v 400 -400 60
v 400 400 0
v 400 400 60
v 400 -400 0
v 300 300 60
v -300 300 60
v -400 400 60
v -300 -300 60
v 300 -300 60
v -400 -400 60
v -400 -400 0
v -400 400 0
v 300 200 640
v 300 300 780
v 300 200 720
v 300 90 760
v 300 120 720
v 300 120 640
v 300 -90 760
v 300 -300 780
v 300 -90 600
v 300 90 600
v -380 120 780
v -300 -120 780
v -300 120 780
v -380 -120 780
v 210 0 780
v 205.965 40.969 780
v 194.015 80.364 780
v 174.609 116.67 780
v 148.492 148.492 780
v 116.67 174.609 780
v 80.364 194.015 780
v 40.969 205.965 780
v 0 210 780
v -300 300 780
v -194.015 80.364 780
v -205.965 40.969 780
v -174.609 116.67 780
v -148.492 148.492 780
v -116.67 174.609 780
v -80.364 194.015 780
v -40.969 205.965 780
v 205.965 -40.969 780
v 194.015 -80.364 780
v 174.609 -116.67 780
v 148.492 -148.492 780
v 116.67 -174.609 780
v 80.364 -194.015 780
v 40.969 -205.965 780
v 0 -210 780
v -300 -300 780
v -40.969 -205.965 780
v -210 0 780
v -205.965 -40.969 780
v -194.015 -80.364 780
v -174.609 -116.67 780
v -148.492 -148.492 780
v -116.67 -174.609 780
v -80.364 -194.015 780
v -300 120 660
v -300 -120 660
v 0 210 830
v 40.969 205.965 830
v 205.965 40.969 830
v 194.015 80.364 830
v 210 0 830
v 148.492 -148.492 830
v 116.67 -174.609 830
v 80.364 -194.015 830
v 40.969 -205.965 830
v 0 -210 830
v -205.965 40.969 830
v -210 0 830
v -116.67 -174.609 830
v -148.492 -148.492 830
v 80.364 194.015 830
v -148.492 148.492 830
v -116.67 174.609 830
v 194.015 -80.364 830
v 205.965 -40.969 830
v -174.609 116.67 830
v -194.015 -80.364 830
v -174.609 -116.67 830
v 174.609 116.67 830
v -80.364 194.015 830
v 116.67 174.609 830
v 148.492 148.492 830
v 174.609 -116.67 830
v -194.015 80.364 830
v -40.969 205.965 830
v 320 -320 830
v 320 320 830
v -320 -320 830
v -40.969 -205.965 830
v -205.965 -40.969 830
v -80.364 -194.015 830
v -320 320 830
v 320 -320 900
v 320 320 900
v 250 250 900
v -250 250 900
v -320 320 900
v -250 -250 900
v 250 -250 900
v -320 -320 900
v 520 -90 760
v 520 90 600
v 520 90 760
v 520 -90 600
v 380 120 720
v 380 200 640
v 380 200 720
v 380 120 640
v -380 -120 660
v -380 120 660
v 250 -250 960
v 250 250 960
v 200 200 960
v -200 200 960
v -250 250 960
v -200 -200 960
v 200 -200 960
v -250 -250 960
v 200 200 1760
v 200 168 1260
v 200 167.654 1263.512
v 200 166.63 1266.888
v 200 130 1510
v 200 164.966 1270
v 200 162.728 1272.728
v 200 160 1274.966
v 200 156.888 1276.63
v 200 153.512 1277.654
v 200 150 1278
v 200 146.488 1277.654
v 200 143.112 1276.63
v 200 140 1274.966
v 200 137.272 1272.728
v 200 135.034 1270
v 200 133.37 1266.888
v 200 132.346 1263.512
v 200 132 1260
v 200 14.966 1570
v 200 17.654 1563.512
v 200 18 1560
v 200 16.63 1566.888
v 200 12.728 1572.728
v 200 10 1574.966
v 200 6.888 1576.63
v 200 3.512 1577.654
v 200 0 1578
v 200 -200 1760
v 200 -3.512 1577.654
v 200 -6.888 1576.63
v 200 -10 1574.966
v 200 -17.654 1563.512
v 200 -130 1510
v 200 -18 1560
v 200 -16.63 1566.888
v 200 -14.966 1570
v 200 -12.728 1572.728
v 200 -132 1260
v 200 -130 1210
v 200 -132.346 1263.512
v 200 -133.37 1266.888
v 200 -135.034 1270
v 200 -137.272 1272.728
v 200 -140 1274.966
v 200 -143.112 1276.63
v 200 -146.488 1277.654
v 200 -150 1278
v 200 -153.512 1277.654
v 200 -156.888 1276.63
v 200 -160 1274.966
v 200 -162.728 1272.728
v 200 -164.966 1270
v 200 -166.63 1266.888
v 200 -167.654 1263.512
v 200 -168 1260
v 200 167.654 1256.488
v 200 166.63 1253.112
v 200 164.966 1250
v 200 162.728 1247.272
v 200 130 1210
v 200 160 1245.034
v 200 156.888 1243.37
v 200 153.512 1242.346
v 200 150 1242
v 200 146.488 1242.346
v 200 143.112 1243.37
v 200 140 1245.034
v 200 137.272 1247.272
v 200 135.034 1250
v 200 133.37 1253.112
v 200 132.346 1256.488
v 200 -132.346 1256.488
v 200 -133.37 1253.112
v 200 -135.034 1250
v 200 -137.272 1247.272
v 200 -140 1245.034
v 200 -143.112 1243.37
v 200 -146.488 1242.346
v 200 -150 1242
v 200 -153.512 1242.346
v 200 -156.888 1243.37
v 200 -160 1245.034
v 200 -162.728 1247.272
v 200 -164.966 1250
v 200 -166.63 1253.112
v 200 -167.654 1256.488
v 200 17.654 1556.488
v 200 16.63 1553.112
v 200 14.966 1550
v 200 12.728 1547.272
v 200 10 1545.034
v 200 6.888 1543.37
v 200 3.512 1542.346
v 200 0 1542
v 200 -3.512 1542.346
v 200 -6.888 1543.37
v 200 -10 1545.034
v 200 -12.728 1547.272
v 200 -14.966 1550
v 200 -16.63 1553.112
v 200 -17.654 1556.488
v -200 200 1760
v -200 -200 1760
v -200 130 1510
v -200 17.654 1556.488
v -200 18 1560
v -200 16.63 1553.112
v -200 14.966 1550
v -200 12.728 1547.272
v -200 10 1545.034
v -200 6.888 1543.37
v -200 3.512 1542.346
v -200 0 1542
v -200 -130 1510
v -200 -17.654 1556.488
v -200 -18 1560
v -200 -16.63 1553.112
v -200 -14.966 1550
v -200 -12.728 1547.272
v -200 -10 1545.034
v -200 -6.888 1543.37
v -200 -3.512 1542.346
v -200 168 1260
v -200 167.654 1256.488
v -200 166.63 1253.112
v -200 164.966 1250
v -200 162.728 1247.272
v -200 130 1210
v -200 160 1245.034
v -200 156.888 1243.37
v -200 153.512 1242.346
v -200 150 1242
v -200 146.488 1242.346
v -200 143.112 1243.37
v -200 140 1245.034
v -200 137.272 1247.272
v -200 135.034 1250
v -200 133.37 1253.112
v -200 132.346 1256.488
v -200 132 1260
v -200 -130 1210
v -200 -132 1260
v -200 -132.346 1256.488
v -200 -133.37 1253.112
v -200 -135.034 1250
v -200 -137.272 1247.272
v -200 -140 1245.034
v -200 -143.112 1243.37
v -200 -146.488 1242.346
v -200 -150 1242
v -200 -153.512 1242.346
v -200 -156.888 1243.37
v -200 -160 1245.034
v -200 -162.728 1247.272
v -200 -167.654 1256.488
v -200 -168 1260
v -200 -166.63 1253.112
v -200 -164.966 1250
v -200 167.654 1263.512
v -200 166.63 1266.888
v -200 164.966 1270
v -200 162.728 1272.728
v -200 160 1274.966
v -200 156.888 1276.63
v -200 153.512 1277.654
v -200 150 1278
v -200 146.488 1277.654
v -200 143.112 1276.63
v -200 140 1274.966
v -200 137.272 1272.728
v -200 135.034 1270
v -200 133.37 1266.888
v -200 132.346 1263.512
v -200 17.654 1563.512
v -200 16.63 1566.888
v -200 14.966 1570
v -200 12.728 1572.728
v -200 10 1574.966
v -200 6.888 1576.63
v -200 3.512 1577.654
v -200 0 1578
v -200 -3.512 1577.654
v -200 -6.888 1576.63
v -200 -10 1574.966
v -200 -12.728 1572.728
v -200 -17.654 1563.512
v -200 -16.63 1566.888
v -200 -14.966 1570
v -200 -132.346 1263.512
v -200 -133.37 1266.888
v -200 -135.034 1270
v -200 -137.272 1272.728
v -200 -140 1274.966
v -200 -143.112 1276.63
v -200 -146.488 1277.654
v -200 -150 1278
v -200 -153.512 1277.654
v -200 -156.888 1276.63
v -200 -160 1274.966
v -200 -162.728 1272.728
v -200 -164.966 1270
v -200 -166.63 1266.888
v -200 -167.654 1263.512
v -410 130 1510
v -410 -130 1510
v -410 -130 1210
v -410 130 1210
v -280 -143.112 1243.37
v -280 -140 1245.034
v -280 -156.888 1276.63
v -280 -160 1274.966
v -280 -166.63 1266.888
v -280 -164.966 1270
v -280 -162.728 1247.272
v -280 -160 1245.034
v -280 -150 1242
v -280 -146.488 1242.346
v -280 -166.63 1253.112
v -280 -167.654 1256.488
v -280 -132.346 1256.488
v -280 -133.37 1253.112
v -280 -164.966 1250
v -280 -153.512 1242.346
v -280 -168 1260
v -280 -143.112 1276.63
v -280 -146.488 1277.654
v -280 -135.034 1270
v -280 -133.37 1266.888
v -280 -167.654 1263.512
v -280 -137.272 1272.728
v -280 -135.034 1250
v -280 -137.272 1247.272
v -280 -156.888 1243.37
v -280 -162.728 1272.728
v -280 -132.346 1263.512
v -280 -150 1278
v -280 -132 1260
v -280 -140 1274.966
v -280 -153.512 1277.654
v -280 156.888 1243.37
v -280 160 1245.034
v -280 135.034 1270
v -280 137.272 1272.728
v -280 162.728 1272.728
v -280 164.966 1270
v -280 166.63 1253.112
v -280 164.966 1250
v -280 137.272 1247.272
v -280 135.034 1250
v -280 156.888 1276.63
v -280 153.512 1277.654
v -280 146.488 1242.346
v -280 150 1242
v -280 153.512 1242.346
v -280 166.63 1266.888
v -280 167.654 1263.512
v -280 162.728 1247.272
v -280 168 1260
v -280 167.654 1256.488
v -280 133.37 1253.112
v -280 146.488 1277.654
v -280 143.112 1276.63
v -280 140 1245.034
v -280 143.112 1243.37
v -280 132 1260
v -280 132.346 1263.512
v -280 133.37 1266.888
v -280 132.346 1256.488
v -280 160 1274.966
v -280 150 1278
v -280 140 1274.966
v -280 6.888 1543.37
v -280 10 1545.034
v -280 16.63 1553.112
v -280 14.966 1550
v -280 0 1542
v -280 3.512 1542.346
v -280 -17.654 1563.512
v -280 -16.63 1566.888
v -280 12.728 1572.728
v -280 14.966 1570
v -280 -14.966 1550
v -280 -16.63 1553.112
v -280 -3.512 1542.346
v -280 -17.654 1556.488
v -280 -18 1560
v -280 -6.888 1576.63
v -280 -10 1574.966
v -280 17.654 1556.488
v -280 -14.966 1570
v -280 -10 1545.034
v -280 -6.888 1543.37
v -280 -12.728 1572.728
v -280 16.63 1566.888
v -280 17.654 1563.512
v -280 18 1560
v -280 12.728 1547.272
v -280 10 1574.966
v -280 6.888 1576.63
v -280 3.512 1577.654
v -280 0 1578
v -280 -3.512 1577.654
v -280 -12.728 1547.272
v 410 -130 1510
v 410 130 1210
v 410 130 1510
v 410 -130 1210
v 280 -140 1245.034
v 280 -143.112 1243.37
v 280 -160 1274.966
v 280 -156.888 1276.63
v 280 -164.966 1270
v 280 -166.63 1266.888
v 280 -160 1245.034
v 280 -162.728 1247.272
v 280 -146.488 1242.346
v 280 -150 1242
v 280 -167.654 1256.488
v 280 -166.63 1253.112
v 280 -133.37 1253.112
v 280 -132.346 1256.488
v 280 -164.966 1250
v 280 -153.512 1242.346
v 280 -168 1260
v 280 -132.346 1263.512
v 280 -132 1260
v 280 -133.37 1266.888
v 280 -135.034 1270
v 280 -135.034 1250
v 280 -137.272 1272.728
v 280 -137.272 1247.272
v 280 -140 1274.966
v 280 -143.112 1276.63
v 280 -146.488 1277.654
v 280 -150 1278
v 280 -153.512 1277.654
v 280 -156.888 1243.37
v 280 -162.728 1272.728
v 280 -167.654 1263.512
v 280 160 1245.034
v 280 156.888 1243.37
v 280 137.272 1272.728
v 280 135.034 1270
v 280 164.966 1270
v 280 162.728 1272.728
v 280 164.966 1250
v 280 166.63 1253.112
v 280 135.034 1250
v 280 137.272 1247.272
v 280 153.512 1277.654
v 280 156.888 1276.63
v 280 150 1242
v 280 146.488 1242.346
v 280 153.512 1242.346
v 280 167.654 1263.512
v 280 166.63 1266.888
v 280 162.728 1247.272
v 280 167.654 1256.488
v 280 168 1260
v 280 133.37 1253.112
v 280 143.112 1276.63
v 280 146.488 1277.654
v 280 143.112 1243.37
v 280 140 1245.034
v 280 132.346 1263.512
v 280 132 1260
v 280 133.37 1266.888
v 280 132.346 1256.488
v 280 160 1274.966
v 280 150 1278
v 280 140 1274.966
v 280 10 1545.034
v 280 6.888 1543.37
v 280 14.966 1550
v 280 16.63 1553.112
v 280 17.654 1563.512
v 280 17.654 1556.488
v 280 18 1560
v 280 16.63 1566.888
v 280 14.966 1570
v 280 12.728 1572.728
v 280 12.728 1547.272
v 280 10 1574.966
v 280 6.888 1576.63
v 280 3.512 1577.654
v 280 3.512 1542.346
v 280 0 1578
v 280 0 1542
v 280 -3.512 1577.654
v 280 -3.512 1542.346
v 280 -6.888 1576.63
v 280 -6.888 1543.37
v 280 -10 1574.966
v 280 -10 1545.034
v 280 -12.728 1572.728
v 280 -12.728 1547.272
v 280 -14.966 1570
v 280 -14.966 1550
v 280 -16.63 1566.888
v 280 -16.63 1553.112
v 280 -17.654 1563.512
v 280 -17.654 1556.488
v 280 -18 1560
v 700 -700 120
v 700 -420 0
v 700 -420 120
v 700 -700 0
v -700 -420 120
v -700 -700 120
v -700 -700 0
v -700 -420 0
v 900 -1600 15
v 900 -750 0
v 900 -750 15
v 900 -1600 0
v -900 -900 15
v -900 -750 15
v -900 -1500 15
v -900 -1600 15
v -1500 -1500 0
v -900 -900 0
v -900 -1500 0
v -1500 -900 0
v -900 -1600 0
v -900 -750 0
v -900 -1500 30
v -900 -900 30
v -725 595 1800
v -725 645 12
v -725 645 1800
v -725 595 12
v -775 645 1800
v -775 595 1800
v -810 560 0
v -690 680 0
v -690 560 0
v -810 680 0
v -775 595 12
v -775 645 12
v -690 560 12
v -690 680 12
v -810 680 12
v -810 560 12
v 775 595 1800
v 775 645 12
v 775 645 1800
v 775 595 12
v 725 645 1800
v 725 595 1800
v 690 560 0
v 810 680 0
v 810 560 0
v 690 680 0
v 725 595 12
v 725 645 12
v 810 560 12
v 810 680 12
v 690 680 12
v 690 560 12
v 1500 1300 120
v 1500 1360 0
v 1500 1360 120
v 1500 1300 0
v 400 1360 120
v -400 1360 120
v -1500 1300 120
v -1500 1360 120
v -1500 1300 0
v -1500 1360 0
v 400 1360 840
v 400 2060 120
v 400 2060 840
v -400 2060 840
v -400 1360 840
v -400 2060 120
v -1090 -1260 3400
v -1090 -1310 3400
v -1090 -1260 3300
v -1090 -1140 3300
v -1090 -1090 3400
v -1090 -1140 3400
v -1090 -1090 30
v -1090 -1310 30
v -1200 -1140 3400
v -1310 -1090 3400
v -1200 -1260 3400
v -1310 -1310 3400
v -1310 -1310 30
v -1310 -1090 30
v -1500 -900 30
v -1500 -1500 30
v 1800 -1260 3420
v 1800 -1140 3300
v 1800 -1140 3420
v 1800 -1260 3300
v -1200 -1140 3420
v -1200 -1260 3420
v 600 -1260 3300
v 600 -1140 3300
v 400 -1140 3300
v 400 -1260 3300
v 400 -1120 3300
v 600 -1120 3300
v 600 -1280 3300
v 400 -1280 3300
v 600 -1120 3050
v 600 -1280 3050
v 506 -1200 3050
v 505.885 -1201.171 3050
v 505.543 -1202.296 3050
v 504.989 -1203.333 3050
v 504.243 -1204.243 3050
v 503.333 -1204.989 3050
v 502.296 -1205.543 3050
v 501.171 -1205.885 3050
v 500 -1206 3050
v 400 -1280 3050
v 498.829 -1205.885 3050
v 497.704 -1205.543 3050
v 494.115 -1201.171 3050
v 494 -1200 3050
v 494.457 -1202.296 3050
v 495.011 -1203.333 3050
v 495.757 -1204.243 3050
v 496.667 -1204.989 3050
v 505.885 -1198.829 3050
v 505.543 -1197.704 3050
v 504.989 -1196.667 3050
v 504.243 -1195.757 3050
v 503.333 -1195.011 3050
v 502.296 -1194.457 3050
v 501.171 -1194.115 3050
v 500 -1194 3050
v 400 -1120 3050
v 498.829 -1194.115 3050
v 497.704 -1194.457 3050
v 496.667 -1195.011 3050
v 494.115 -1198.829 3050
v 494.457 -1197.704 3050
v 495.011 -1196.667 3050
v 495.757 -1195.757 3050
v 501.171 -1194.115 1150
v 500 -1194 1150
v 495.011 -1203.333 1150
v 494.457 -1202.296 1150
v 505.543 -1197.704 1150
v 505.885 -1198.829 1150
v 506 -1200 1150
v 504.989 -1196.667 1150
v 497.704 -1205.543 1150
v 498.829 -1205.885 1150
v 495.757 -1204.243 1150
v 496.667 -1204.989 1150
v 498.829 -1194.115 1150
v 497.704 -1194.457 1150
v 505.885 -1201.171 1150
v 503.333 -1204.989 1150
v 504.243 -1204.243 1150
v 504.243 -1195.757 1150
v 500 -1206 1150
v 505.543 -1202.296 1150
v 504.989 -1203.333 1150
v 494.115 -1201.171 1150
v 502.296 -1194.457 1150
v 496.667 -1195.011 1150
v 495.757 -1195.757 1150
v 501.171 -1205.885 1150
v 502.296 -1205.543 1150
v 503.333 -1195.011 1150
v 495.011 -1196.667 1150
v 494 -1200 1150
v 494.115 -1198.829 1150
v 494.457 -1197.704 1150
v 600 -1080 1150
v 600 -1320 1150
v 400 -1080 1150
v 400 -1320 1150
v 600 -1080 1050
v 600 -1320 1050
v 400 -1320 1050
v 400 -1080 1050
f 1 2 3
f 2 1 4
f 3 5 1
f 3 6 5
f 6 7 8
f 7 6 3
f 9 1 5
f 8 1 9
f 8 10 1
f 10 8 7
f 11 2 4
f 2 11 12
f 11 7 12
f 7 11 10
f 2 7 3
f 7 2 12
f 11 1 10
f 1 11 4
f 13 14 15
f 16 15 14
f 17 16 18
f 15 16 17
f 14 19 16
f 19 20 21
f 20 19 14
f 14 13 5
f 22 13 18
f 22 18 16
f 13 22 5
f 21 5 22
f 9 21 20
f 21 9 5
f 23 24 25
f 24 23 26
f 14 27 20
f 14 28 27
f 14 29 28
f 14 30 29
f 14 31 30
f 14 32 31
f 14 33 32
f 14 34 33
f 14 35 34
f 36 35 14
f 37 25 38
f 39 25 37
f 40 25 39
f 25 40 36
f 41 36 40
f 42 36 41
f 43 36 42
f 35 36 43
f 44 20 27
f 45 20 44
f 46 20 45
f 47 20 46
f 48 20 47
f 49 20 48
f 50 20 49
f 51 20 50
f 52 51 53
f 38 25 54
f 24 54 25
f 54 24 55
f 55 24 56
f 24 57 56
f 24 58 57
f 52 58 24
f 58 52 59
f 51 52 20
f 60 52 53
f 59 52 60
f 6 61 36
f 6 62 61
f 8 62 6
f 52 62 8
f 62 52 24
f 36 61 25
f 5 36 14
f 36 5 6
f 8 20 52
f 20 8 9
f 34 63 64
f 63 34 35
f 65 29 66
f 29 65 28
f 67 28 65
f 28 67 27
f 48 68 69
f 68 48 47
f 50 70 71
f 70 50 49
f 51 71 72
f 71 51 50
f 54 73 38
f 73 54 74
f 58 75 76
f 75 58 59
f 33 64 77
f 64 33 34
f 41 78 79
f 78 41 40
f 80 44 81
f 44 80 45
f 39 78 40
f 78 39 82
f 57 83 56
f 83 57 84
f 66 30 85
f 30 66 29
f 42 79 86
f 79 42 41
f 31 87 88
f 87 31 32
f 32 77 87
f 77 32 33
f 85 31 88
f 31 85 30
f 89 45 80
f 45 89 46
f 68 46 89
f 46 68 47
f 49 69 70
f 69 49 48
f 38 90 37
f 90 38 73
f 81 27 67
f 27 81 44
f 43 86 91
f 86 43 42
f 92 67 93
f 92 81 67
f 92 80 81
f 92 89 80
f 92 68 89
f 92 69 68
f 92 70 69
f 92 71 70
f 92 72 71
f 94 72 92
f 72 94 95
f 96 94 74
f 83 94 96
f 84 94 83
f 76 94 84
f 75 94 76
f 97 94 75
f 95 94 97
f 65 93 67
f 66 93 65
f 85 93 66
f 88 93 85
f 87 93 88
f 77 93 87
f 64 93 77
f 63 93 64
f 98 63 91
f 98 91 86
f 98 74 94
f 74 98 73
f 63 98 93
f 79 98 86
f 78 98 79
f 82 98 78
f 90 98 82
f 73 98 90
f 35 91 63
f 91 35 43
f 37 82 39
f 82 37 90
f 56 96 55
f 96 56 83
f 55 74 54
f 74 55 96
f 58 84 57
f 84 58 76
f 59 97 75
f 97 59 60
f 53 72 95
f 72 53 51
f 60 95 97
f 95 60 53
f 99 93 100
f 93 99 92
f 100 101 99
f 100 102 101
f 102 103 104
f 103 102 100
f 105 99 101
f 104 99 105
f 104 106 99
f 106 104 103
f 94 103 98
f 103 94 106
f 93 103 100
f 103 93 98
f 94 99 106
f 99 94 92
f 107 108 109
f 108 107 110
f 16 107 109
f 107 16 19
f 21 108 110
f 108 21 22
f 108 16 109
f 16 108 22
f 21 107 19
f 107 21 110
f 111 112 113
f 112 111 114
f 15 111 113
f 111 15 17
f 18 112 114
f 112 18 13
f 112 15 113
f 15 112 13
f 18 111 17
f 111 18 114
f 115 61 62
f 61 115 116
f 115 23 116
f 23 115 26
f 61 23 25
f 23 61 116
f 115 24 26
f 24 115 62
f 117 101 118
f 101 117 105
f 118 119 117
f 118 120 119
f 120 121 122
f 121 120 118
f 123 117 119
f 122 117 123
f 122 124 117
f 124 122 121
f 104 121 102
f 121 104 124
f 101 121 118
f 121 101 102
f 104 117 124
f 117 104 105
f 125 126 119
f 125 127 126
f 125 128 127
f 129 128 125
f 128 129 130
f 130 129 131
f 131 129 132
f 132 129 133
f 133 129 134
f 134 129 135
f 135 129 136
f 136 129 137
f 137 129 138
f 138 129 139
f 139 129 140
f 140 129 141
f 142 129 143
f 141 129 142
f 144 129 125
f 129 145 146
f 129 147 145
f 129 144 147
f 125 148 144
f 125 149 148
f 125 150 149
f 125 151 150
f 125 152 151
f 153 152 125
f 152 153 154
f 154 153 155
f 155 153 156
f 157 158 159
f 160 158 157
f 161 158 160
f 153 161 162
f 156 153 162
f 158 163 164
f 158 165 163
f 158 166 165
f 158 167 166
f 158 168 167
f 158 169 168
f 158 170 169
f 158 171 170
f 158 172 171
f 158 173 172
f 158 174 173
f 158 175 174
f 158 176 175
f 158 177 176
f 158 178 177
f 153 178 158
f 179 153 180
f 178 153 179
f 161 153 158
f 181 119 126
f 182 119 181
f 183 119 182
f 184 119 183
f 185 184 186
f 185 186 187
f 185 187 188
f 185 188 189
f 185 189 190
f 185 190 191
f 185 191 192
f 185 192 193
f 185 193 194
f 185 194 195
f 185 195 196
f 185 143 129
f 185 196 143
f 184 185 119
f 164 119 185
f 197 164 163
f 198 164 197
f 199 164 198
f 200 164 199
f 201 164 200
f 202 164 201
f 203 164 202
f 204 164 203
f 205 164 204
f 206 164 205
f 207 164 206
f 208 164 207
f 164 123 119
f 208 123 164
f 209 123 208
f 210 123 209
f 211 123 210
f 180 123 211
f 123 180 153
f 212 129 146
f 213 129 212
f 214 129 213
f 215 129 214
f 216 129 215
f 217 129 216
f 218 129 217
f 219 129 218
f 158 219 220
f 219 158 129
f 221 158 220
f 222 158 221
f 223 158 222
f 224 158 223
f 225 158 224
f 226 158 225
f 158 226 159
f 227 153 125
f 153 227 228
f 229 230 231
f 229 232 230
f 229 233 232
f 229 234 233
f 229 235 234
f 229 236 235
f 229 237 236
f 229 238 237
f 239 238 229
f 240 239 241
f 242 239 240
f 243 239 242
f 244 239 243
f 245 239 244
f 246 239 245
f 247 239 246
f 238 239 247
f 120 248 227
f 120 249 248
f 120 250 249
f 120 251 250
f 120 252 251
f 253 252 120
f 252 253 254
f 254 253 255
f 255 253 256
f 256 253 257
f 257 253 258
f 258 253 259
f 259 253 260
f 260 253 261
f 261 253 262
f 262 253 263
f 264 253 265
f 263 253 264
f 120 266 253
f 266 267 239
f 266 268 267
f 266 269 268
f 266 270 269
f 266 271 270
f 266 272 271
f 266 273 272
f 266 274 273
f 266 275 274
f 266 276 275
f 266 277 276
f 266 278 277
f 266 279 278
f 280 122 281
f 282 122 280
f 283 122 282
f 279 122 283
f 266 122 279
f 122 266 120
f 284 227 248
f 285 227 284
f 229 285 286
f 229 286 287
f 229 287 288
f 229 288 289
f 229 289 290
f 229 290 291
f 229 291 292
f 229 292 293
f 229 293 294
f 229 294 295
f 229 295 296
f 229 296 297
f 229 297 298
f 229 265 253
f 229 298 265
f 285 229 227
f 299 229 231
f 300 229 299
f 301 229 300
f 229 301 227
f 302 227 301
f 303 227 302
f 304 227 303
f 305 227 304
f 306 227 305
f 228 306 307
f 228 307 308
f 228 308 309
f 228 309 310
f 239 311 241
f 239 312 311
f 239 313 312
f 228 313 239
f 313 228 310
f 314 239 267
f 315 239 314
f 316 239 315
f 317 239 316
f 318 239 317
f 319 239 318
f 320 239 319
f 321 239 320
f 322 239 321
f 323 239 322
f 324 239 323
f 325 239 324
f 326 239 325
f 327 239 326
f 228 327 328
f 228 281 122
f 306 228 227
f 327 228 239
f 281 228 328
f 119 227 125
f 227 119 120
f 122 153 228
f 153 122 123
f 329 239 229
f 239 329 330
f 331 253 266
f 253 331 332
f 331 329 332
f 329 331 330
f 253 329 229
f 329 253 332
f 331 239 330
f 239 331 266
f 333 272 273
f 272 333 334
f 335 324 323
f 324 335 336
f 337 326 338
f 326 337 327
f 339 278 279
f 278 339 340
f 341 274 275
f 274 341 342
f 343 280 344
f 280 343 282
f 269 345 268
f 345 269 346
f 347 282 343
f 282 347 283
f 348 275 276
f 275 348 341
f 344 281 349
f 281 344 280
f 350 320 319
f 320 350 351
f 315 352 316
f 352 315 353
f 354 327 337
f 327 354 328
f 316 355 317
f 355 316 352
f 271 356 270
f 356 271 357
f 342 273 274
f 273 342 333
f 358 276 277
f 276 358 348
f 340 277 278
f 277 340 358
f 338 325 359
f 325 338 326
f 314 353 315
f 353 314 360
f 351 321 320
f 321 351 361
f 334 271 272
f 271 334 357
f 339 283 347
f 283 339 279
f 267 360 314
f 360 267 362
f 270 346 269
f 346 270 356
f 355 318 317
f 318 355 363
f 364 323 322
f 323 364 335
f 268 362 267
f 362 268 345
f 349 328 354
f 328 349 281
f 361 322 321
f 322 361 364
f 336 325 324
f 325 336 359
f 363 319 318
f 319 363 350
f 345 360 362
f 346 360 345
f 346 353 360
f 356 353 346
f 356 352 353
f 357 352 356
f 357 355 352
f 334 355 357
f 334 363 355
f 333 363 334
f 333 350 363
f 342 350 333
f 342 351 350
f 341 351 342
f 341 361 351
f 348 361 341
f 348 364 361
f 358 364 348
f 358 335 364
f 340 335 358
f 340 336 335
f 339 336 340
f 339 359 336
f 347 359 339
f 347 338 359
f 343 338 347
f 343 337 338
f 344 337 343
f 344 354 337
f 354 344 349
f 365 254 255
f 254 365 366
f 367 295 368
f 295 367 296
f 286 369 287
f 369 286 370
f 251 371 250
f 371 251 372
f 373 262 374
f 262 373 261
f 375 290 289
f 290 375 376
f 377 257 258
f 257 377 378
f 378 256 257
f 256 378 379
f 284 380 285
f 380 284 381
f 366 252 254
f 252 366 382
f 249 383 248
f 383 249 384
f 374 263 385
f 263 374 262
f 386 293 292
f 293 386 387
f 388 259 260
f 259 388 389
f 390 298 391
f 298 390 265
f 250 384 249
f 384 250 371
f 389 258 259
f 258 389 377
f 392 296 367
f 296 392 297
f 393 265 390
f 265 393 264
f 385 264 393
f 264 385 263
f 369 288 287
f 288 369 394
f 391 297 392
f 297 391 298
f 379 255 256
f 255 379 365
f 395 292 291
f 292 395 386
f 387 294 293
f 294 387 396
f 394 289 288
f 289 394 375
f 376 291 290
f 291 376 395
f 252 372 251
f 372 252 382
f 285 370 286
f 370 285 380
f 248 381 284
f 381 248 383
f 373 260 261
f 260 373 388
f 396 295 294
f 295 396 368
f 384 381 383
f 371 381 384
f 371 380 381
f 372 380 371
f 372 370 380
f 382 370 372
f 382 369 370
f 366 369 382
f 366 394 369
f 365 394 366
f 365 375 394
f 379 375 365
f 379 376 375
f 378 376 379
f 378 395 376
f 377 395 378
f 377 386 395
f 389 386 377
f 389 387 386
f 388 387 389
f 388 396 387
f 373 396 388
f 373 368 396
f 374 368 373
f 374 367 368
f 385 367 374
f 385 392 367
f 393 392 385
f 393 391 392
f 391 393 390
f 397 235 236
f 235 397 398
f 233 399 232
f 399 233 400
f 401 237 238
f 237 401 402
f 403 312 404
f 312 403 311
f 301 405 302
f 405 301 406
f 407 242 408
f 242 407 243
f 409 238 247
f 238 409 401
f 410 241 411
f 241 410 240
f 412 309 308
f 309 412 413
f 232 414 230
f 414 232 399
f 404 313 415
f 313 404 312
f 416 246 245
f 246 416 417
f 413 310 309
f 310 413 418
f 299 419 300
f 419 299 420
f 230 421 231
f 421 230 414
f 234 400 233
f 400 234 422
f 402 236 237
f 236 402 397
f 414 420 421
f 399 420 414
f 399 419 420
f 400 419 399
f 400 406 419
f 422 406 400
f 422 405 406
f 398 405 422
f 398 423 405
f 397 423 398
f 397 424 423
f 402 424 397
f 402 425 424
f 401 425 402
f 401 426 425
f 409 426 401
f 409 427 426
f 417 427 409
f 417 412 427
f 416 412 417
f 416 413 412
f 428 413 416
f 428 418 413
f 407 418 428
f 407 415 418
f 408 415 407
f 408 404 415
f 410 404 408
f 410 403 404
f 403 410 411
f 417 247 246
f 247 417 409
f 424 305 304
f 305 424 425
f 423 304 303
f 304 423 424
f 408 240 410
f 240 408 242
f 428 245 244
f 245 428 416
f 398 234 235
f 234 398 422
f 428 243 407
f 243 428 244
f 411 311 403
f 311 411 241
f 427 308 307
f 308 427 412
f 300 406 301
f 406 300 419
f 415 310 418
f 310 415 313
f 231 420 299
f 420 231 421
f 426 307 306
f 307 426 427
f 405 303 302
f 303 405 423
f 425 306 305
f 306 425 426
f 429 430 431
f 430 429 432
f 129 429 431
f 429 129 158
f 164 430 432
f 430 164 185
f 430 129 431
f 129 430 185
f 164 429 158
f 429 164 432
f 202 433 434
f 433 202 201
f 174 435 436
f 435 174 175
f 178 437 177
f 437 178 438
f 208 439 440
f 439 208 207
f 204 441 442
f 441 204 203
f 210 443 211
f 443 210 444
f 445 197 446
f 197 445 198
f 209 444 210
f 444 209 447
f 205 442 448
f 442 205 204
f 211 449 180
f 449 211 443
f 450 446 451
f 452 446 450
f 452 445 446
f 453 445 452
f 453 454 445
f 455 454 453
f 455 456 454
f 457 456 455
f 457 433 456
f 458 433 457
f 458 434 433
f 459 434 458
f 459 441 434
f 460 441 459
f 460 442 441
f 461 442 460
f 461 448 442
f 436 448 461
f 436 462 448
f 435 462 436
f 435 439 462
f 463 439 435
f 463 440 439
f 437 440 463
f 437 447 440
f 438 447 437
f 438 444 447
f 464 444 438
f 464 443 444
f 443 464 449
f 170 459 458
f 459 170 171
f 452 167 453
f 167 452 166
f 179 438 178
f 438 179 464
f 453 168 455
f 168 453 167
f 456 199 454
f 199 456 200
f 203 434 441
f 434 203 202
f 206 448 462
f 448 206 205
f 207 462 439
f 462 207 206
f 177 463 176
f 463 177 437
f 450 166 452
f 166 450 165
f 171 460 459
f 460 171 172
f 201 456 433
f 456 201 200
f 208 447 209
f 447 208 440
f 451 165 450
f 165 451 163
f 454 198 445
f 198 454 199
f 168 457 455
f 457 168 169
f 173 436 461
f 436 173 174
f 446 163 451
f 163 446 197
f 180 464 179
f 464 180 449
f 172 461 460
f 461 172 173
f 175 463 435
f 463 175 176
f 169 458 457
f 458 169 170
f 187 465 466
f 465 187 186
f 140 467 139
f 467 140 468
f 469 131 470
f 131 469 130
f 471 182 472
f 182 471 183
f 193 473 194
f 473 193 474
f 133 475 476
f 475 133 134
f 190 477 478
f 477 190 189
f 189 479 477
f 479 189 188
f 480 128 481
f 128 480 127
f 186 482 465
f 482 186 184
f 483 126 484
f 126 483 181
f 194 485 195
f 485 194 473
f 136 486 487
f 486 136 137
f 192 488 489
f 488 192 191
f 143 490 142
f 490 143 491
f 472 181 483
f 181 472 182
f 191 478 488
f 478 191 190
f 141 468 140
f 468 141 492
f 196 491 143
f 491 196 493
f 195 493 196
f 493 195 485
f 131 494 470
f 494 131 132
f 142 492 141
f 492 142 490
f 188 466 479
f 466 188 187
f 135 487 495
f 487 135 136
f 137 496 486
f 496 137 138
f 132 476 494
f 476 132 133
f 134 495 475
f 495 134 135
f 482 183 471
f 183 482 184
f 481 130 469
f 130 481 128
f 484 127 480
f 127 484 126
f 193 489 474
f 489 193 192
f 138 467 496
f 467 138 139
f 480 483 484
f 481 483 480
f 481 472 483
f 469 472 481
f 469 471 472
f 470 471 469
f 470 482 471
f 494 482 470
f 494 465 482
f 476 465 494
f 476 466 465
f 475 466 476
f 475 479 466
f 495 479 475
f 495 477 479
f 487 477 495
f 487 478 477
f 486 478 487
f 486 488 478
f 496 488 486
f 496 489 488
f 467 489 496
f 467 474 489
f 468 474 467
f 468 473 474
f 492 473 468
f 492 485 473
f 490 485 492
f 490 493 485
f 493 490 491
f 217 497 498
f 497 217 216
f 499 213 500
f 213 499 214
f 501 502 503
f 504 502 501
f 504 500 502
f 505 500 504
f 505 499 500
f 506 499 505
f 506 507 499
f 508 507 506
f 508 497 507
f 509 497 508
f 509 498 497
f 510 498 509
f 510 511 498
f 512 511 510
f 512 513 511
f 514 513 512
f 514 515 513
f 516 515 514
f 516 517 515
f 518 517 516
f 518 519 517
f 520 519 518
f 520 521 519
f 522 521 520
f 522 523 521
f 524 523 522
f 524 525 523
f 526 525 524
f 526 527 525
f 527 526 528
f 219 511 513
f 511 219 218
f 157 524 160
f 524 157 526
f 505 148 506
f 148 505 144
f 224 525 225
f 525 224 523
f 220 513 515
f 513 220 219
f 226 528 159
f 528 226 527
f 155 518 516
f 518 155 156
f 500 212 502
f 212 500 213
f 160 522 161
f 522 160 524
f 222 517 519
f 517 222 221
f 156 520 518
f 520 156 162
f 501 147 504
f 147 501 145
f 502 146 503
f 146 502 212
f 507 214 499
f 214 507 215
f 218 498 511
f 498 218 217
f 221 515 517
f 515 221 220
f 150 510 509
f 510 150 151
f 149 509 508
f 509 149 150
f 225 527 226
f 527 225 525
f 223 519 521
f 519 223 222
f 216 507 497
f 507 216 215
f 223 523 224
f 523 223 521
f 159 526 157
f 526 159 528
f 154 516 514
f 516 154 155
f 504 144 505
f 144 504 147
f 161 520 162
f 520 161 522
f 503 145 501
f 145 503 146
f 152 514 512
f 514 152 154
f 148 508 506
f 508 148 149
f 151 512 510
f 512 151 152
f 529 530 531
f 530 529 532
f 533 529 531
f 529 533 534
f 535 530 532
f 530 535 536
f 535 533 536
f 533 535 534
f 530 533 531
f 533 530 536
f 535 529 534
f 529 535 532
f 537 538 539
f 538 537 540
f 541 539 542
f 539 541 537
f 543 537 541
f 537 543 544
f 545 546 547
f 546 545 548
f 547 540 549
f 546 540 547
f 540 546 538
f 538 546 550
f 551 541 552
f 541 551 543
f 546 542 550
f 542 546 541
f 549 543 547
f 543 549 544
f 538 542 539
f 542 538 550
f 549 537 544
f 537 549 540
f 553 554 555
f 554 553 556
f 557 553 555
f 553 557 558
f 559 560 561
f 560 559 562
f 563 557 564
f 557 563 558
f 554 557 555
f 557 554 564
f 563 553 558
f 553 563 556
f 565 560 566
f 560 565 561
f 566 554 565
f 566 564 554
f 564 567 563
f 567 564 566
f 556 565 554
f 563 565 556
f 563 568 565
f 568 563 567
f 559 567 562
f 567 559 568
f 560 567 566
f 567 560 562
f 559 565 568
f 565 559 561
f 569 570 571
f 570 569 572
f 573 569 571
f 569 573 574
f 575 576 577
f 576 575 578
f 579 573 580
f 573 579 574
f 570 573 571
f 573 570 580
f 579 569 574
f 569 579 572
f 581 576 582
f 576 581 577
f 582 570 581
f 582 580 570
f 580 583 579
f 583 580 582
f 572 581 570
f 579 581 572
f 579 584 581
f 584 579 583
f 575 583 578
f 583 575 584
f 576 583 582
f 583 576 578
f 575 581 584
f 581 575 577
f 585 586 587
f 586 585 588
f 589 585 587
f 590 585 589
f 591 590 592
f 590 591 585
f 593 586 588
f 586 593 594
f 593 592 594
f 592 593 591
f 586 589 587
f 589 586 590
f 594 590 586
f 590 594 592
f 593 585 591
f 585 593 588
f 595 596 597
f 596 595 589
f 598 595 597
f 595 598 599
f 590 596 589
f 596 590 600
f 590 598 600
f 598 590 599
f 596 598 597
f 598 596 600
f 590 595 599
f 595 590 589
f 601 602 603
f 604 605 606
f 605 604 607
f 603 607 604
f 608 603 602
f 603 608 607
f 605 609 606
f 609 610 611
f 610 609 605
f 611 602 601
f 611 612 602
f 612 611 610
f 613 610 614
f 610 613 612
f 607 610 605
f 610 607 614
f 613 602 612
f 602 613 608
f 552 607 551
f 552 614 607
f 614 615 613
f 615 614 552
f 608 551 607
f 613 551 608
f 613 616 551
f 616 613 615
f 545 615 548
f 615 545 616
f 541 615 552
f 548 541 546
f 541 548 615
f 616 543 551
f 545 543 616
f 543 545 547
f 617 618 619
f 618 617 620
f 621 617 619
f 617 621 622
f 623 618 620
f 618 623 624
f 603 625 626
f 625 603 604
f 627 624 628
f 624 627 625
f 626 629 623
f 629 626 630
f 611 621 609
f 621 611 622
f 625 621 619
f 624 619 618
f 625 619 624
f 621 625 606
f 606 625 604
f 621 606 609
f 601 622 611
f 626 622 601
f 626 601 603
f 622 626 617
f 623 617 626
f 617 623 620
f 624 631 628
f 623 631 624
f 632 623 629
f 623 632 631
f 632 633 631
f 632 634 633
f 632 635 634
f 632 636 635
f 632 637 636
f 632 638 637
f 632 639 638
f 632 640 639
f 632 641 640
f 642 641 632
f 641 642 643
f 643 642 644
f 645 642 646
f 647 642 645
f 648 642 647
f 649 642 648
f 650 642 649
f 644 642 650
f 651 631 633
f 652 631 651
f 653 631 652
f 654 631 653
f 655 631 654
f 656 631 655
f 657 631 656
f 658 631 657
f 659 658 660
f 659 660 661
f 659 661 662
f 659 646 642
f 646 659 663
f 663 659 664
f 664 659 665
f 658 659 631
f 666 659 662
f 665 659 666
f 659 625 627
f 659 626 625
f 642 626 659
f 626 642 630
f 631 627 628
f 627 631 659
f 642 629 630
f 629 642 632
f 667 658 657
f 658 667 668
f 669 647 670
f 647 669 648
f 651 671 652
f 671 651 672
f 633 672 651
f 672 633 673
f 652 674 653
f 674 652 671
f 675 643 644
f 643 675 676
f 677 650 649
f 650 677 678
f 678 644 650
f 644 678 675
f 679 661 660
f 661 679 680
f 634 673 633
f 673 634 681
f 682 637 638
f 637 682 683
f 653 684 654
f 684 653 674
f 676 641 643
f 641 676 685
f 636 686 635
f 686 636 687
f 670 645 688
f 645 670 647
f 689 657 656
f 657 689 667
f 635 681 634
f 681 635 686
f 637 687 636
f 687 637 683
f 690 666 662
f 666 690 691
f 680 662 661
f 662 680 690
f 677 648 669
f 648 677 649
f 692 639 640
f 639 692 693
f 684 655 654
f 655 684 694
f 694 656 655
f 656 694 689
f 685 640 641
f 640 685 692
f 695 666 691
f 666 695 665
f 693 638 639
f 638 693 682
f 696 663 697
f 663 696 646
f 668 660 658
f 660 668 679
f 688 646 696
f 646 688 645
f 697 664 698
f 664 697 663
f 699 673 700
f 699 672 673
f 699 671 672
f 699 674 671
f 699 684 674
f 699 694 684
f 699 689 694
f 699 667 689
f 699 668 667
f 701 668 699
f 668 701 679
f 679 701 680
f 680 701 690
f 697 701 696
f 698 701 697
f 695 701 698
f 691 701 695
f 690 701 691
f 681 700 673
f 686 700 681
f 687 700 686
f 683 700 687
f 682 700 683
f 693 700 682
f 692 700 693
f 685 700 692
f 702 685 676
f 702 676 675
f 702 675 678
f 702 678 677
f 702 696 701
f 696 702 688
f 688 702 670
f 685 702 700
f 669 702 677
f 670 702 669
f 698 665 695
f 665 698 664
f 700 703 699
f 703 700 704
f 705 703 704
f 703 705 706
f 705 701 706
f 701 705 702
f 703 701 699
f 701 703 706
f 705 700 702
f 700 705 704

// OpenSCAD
// hmc_load_station - generated by stations_3d.py from out/stations/stations_specs.json (F4.3) - units mm
// DESIGN - check and release before manufacture. z up, conveyor top z = 700.

module hmc_load_station() {
  translate([-400.00, -400.00, 0.00]) cube([800.00, 800.00, 60.00]);
  translate([-300.00, -300.00, 60.00]) cube([600.00, 600.00, 720.00]);
  translate([0.00, 0.00, 800.00]) rotate([0, 0, 0]) cylinder(r = 210.00, h = 60.00, center = true, $fn = 32);
  translate([-320.00, -320.00, 830.00]) cube([640.00, 640.00, 70.00]);
  translate([300.00, -90.00, 600.00]) cube([220.00, 180.00, 160.00]);
  translate([300.00, 120.00, 640.00]) cube([80.00, 80.00, 80.00]);
  translate([-380.00, -120.00, 660.00]) cube([80.00, 240.00, 120.00]);
  translate([-250.00, -250.00, 900.00]) cube([500.00, 500.00, 60.00]);
  translate([-200.00, -200.00, 960.00]) cube([400.00, 400.00, 800.00]);
  translate([-410.00, -130.00, 1210.00]) cube([210.00, 260.00, 300.00]);
  translate([-240.00, -150.00, 1260.00]) rotate([0, 90, 0]) cylinder(r = 18.00, h = 80.00, center = true, $fn = 32);
  translate([-240.00, 150.00, 1260.00]) rotate([0, 90, 0]) cylinder(r = 18.00, h = 80.00, center = true, $fn = 32);
  translate([-240.00, 0.00, 1560.00]) rotate([0, 90, 0]) cylinder(r = 18.00, h = 80.00, center = true, $fn = 32);
  translate([200.00, -130.00, 1210.00]) cube([210.00, 260.00, 300.00]);
  translate([240.00, -150.00, 1260.00]) rotate([0, 90, 0]) cylinder(r = 18.00, h = 80.00, center = true, $fn = 32);
  translate([240.00, 150.00, 1260.00]) rotate([0, 90, 0]) cylinder(r = 18.00, h = 80.00, center = true, $fn = 32);
  translate([240.00, 0.00, 1560.00]) rotate([0, 90, 0]) cylinder(r = 18.00, h = 80.00, center = true, $fn = 32);
  translate([-700.00, -700.00, 0.00]) cube([1400.00, 280.00, 120.00]);
  translate([-900.00, -1600.00, 0.00]) cube([1800.00, 850.00, 15.00]);
  translate([-775.00, 595.00, 0.00]) cube([50.00, 50.00, 1800.00]);
  translate([-810.00, 560.00, 0.00]) cube([120.00, 120.00, 12.00]);
  translate([725.00, 595.00, 0.00]) cube([50.00, 50.00, 1800.00]);
  translate([690.00, 560.00, 0.00]) cube([120.00, 120.00, 12.00]);
  translate([-1500.00, 1300.00, 0.00]) cube([3000.00, 60.00, 120.00]);
  translate([-400.00, 1360.00, 120.00]) cube([800.00, 700.00, 720.00]);
  translate([-1310.00, -1310.00, 0.00]) cube([220.00, 220.00, 3400.00]);
  translate([-1500.00, -1500.00, 0.00]) cube([600.00, 600.00, 30.00]);
  translate([-1200.00, -1260.00, 3300.00]) cube([3000.00, 120.00, 120.00]);
  translate([400.00, -1280.00, 3050.00]) cube([200.00, 160.00, 250.00]);
  translate([500.00, -1200.00, 2100.00]) rotate([0, 0, 0]) cylinder(r = 6.00, h = 1900.00, center = true, $fn = 32);
  translate([400.00, -1320.00, 1050.00]) cube([200.00, 240.00, 100.00]);
}
hmc_load_station();
